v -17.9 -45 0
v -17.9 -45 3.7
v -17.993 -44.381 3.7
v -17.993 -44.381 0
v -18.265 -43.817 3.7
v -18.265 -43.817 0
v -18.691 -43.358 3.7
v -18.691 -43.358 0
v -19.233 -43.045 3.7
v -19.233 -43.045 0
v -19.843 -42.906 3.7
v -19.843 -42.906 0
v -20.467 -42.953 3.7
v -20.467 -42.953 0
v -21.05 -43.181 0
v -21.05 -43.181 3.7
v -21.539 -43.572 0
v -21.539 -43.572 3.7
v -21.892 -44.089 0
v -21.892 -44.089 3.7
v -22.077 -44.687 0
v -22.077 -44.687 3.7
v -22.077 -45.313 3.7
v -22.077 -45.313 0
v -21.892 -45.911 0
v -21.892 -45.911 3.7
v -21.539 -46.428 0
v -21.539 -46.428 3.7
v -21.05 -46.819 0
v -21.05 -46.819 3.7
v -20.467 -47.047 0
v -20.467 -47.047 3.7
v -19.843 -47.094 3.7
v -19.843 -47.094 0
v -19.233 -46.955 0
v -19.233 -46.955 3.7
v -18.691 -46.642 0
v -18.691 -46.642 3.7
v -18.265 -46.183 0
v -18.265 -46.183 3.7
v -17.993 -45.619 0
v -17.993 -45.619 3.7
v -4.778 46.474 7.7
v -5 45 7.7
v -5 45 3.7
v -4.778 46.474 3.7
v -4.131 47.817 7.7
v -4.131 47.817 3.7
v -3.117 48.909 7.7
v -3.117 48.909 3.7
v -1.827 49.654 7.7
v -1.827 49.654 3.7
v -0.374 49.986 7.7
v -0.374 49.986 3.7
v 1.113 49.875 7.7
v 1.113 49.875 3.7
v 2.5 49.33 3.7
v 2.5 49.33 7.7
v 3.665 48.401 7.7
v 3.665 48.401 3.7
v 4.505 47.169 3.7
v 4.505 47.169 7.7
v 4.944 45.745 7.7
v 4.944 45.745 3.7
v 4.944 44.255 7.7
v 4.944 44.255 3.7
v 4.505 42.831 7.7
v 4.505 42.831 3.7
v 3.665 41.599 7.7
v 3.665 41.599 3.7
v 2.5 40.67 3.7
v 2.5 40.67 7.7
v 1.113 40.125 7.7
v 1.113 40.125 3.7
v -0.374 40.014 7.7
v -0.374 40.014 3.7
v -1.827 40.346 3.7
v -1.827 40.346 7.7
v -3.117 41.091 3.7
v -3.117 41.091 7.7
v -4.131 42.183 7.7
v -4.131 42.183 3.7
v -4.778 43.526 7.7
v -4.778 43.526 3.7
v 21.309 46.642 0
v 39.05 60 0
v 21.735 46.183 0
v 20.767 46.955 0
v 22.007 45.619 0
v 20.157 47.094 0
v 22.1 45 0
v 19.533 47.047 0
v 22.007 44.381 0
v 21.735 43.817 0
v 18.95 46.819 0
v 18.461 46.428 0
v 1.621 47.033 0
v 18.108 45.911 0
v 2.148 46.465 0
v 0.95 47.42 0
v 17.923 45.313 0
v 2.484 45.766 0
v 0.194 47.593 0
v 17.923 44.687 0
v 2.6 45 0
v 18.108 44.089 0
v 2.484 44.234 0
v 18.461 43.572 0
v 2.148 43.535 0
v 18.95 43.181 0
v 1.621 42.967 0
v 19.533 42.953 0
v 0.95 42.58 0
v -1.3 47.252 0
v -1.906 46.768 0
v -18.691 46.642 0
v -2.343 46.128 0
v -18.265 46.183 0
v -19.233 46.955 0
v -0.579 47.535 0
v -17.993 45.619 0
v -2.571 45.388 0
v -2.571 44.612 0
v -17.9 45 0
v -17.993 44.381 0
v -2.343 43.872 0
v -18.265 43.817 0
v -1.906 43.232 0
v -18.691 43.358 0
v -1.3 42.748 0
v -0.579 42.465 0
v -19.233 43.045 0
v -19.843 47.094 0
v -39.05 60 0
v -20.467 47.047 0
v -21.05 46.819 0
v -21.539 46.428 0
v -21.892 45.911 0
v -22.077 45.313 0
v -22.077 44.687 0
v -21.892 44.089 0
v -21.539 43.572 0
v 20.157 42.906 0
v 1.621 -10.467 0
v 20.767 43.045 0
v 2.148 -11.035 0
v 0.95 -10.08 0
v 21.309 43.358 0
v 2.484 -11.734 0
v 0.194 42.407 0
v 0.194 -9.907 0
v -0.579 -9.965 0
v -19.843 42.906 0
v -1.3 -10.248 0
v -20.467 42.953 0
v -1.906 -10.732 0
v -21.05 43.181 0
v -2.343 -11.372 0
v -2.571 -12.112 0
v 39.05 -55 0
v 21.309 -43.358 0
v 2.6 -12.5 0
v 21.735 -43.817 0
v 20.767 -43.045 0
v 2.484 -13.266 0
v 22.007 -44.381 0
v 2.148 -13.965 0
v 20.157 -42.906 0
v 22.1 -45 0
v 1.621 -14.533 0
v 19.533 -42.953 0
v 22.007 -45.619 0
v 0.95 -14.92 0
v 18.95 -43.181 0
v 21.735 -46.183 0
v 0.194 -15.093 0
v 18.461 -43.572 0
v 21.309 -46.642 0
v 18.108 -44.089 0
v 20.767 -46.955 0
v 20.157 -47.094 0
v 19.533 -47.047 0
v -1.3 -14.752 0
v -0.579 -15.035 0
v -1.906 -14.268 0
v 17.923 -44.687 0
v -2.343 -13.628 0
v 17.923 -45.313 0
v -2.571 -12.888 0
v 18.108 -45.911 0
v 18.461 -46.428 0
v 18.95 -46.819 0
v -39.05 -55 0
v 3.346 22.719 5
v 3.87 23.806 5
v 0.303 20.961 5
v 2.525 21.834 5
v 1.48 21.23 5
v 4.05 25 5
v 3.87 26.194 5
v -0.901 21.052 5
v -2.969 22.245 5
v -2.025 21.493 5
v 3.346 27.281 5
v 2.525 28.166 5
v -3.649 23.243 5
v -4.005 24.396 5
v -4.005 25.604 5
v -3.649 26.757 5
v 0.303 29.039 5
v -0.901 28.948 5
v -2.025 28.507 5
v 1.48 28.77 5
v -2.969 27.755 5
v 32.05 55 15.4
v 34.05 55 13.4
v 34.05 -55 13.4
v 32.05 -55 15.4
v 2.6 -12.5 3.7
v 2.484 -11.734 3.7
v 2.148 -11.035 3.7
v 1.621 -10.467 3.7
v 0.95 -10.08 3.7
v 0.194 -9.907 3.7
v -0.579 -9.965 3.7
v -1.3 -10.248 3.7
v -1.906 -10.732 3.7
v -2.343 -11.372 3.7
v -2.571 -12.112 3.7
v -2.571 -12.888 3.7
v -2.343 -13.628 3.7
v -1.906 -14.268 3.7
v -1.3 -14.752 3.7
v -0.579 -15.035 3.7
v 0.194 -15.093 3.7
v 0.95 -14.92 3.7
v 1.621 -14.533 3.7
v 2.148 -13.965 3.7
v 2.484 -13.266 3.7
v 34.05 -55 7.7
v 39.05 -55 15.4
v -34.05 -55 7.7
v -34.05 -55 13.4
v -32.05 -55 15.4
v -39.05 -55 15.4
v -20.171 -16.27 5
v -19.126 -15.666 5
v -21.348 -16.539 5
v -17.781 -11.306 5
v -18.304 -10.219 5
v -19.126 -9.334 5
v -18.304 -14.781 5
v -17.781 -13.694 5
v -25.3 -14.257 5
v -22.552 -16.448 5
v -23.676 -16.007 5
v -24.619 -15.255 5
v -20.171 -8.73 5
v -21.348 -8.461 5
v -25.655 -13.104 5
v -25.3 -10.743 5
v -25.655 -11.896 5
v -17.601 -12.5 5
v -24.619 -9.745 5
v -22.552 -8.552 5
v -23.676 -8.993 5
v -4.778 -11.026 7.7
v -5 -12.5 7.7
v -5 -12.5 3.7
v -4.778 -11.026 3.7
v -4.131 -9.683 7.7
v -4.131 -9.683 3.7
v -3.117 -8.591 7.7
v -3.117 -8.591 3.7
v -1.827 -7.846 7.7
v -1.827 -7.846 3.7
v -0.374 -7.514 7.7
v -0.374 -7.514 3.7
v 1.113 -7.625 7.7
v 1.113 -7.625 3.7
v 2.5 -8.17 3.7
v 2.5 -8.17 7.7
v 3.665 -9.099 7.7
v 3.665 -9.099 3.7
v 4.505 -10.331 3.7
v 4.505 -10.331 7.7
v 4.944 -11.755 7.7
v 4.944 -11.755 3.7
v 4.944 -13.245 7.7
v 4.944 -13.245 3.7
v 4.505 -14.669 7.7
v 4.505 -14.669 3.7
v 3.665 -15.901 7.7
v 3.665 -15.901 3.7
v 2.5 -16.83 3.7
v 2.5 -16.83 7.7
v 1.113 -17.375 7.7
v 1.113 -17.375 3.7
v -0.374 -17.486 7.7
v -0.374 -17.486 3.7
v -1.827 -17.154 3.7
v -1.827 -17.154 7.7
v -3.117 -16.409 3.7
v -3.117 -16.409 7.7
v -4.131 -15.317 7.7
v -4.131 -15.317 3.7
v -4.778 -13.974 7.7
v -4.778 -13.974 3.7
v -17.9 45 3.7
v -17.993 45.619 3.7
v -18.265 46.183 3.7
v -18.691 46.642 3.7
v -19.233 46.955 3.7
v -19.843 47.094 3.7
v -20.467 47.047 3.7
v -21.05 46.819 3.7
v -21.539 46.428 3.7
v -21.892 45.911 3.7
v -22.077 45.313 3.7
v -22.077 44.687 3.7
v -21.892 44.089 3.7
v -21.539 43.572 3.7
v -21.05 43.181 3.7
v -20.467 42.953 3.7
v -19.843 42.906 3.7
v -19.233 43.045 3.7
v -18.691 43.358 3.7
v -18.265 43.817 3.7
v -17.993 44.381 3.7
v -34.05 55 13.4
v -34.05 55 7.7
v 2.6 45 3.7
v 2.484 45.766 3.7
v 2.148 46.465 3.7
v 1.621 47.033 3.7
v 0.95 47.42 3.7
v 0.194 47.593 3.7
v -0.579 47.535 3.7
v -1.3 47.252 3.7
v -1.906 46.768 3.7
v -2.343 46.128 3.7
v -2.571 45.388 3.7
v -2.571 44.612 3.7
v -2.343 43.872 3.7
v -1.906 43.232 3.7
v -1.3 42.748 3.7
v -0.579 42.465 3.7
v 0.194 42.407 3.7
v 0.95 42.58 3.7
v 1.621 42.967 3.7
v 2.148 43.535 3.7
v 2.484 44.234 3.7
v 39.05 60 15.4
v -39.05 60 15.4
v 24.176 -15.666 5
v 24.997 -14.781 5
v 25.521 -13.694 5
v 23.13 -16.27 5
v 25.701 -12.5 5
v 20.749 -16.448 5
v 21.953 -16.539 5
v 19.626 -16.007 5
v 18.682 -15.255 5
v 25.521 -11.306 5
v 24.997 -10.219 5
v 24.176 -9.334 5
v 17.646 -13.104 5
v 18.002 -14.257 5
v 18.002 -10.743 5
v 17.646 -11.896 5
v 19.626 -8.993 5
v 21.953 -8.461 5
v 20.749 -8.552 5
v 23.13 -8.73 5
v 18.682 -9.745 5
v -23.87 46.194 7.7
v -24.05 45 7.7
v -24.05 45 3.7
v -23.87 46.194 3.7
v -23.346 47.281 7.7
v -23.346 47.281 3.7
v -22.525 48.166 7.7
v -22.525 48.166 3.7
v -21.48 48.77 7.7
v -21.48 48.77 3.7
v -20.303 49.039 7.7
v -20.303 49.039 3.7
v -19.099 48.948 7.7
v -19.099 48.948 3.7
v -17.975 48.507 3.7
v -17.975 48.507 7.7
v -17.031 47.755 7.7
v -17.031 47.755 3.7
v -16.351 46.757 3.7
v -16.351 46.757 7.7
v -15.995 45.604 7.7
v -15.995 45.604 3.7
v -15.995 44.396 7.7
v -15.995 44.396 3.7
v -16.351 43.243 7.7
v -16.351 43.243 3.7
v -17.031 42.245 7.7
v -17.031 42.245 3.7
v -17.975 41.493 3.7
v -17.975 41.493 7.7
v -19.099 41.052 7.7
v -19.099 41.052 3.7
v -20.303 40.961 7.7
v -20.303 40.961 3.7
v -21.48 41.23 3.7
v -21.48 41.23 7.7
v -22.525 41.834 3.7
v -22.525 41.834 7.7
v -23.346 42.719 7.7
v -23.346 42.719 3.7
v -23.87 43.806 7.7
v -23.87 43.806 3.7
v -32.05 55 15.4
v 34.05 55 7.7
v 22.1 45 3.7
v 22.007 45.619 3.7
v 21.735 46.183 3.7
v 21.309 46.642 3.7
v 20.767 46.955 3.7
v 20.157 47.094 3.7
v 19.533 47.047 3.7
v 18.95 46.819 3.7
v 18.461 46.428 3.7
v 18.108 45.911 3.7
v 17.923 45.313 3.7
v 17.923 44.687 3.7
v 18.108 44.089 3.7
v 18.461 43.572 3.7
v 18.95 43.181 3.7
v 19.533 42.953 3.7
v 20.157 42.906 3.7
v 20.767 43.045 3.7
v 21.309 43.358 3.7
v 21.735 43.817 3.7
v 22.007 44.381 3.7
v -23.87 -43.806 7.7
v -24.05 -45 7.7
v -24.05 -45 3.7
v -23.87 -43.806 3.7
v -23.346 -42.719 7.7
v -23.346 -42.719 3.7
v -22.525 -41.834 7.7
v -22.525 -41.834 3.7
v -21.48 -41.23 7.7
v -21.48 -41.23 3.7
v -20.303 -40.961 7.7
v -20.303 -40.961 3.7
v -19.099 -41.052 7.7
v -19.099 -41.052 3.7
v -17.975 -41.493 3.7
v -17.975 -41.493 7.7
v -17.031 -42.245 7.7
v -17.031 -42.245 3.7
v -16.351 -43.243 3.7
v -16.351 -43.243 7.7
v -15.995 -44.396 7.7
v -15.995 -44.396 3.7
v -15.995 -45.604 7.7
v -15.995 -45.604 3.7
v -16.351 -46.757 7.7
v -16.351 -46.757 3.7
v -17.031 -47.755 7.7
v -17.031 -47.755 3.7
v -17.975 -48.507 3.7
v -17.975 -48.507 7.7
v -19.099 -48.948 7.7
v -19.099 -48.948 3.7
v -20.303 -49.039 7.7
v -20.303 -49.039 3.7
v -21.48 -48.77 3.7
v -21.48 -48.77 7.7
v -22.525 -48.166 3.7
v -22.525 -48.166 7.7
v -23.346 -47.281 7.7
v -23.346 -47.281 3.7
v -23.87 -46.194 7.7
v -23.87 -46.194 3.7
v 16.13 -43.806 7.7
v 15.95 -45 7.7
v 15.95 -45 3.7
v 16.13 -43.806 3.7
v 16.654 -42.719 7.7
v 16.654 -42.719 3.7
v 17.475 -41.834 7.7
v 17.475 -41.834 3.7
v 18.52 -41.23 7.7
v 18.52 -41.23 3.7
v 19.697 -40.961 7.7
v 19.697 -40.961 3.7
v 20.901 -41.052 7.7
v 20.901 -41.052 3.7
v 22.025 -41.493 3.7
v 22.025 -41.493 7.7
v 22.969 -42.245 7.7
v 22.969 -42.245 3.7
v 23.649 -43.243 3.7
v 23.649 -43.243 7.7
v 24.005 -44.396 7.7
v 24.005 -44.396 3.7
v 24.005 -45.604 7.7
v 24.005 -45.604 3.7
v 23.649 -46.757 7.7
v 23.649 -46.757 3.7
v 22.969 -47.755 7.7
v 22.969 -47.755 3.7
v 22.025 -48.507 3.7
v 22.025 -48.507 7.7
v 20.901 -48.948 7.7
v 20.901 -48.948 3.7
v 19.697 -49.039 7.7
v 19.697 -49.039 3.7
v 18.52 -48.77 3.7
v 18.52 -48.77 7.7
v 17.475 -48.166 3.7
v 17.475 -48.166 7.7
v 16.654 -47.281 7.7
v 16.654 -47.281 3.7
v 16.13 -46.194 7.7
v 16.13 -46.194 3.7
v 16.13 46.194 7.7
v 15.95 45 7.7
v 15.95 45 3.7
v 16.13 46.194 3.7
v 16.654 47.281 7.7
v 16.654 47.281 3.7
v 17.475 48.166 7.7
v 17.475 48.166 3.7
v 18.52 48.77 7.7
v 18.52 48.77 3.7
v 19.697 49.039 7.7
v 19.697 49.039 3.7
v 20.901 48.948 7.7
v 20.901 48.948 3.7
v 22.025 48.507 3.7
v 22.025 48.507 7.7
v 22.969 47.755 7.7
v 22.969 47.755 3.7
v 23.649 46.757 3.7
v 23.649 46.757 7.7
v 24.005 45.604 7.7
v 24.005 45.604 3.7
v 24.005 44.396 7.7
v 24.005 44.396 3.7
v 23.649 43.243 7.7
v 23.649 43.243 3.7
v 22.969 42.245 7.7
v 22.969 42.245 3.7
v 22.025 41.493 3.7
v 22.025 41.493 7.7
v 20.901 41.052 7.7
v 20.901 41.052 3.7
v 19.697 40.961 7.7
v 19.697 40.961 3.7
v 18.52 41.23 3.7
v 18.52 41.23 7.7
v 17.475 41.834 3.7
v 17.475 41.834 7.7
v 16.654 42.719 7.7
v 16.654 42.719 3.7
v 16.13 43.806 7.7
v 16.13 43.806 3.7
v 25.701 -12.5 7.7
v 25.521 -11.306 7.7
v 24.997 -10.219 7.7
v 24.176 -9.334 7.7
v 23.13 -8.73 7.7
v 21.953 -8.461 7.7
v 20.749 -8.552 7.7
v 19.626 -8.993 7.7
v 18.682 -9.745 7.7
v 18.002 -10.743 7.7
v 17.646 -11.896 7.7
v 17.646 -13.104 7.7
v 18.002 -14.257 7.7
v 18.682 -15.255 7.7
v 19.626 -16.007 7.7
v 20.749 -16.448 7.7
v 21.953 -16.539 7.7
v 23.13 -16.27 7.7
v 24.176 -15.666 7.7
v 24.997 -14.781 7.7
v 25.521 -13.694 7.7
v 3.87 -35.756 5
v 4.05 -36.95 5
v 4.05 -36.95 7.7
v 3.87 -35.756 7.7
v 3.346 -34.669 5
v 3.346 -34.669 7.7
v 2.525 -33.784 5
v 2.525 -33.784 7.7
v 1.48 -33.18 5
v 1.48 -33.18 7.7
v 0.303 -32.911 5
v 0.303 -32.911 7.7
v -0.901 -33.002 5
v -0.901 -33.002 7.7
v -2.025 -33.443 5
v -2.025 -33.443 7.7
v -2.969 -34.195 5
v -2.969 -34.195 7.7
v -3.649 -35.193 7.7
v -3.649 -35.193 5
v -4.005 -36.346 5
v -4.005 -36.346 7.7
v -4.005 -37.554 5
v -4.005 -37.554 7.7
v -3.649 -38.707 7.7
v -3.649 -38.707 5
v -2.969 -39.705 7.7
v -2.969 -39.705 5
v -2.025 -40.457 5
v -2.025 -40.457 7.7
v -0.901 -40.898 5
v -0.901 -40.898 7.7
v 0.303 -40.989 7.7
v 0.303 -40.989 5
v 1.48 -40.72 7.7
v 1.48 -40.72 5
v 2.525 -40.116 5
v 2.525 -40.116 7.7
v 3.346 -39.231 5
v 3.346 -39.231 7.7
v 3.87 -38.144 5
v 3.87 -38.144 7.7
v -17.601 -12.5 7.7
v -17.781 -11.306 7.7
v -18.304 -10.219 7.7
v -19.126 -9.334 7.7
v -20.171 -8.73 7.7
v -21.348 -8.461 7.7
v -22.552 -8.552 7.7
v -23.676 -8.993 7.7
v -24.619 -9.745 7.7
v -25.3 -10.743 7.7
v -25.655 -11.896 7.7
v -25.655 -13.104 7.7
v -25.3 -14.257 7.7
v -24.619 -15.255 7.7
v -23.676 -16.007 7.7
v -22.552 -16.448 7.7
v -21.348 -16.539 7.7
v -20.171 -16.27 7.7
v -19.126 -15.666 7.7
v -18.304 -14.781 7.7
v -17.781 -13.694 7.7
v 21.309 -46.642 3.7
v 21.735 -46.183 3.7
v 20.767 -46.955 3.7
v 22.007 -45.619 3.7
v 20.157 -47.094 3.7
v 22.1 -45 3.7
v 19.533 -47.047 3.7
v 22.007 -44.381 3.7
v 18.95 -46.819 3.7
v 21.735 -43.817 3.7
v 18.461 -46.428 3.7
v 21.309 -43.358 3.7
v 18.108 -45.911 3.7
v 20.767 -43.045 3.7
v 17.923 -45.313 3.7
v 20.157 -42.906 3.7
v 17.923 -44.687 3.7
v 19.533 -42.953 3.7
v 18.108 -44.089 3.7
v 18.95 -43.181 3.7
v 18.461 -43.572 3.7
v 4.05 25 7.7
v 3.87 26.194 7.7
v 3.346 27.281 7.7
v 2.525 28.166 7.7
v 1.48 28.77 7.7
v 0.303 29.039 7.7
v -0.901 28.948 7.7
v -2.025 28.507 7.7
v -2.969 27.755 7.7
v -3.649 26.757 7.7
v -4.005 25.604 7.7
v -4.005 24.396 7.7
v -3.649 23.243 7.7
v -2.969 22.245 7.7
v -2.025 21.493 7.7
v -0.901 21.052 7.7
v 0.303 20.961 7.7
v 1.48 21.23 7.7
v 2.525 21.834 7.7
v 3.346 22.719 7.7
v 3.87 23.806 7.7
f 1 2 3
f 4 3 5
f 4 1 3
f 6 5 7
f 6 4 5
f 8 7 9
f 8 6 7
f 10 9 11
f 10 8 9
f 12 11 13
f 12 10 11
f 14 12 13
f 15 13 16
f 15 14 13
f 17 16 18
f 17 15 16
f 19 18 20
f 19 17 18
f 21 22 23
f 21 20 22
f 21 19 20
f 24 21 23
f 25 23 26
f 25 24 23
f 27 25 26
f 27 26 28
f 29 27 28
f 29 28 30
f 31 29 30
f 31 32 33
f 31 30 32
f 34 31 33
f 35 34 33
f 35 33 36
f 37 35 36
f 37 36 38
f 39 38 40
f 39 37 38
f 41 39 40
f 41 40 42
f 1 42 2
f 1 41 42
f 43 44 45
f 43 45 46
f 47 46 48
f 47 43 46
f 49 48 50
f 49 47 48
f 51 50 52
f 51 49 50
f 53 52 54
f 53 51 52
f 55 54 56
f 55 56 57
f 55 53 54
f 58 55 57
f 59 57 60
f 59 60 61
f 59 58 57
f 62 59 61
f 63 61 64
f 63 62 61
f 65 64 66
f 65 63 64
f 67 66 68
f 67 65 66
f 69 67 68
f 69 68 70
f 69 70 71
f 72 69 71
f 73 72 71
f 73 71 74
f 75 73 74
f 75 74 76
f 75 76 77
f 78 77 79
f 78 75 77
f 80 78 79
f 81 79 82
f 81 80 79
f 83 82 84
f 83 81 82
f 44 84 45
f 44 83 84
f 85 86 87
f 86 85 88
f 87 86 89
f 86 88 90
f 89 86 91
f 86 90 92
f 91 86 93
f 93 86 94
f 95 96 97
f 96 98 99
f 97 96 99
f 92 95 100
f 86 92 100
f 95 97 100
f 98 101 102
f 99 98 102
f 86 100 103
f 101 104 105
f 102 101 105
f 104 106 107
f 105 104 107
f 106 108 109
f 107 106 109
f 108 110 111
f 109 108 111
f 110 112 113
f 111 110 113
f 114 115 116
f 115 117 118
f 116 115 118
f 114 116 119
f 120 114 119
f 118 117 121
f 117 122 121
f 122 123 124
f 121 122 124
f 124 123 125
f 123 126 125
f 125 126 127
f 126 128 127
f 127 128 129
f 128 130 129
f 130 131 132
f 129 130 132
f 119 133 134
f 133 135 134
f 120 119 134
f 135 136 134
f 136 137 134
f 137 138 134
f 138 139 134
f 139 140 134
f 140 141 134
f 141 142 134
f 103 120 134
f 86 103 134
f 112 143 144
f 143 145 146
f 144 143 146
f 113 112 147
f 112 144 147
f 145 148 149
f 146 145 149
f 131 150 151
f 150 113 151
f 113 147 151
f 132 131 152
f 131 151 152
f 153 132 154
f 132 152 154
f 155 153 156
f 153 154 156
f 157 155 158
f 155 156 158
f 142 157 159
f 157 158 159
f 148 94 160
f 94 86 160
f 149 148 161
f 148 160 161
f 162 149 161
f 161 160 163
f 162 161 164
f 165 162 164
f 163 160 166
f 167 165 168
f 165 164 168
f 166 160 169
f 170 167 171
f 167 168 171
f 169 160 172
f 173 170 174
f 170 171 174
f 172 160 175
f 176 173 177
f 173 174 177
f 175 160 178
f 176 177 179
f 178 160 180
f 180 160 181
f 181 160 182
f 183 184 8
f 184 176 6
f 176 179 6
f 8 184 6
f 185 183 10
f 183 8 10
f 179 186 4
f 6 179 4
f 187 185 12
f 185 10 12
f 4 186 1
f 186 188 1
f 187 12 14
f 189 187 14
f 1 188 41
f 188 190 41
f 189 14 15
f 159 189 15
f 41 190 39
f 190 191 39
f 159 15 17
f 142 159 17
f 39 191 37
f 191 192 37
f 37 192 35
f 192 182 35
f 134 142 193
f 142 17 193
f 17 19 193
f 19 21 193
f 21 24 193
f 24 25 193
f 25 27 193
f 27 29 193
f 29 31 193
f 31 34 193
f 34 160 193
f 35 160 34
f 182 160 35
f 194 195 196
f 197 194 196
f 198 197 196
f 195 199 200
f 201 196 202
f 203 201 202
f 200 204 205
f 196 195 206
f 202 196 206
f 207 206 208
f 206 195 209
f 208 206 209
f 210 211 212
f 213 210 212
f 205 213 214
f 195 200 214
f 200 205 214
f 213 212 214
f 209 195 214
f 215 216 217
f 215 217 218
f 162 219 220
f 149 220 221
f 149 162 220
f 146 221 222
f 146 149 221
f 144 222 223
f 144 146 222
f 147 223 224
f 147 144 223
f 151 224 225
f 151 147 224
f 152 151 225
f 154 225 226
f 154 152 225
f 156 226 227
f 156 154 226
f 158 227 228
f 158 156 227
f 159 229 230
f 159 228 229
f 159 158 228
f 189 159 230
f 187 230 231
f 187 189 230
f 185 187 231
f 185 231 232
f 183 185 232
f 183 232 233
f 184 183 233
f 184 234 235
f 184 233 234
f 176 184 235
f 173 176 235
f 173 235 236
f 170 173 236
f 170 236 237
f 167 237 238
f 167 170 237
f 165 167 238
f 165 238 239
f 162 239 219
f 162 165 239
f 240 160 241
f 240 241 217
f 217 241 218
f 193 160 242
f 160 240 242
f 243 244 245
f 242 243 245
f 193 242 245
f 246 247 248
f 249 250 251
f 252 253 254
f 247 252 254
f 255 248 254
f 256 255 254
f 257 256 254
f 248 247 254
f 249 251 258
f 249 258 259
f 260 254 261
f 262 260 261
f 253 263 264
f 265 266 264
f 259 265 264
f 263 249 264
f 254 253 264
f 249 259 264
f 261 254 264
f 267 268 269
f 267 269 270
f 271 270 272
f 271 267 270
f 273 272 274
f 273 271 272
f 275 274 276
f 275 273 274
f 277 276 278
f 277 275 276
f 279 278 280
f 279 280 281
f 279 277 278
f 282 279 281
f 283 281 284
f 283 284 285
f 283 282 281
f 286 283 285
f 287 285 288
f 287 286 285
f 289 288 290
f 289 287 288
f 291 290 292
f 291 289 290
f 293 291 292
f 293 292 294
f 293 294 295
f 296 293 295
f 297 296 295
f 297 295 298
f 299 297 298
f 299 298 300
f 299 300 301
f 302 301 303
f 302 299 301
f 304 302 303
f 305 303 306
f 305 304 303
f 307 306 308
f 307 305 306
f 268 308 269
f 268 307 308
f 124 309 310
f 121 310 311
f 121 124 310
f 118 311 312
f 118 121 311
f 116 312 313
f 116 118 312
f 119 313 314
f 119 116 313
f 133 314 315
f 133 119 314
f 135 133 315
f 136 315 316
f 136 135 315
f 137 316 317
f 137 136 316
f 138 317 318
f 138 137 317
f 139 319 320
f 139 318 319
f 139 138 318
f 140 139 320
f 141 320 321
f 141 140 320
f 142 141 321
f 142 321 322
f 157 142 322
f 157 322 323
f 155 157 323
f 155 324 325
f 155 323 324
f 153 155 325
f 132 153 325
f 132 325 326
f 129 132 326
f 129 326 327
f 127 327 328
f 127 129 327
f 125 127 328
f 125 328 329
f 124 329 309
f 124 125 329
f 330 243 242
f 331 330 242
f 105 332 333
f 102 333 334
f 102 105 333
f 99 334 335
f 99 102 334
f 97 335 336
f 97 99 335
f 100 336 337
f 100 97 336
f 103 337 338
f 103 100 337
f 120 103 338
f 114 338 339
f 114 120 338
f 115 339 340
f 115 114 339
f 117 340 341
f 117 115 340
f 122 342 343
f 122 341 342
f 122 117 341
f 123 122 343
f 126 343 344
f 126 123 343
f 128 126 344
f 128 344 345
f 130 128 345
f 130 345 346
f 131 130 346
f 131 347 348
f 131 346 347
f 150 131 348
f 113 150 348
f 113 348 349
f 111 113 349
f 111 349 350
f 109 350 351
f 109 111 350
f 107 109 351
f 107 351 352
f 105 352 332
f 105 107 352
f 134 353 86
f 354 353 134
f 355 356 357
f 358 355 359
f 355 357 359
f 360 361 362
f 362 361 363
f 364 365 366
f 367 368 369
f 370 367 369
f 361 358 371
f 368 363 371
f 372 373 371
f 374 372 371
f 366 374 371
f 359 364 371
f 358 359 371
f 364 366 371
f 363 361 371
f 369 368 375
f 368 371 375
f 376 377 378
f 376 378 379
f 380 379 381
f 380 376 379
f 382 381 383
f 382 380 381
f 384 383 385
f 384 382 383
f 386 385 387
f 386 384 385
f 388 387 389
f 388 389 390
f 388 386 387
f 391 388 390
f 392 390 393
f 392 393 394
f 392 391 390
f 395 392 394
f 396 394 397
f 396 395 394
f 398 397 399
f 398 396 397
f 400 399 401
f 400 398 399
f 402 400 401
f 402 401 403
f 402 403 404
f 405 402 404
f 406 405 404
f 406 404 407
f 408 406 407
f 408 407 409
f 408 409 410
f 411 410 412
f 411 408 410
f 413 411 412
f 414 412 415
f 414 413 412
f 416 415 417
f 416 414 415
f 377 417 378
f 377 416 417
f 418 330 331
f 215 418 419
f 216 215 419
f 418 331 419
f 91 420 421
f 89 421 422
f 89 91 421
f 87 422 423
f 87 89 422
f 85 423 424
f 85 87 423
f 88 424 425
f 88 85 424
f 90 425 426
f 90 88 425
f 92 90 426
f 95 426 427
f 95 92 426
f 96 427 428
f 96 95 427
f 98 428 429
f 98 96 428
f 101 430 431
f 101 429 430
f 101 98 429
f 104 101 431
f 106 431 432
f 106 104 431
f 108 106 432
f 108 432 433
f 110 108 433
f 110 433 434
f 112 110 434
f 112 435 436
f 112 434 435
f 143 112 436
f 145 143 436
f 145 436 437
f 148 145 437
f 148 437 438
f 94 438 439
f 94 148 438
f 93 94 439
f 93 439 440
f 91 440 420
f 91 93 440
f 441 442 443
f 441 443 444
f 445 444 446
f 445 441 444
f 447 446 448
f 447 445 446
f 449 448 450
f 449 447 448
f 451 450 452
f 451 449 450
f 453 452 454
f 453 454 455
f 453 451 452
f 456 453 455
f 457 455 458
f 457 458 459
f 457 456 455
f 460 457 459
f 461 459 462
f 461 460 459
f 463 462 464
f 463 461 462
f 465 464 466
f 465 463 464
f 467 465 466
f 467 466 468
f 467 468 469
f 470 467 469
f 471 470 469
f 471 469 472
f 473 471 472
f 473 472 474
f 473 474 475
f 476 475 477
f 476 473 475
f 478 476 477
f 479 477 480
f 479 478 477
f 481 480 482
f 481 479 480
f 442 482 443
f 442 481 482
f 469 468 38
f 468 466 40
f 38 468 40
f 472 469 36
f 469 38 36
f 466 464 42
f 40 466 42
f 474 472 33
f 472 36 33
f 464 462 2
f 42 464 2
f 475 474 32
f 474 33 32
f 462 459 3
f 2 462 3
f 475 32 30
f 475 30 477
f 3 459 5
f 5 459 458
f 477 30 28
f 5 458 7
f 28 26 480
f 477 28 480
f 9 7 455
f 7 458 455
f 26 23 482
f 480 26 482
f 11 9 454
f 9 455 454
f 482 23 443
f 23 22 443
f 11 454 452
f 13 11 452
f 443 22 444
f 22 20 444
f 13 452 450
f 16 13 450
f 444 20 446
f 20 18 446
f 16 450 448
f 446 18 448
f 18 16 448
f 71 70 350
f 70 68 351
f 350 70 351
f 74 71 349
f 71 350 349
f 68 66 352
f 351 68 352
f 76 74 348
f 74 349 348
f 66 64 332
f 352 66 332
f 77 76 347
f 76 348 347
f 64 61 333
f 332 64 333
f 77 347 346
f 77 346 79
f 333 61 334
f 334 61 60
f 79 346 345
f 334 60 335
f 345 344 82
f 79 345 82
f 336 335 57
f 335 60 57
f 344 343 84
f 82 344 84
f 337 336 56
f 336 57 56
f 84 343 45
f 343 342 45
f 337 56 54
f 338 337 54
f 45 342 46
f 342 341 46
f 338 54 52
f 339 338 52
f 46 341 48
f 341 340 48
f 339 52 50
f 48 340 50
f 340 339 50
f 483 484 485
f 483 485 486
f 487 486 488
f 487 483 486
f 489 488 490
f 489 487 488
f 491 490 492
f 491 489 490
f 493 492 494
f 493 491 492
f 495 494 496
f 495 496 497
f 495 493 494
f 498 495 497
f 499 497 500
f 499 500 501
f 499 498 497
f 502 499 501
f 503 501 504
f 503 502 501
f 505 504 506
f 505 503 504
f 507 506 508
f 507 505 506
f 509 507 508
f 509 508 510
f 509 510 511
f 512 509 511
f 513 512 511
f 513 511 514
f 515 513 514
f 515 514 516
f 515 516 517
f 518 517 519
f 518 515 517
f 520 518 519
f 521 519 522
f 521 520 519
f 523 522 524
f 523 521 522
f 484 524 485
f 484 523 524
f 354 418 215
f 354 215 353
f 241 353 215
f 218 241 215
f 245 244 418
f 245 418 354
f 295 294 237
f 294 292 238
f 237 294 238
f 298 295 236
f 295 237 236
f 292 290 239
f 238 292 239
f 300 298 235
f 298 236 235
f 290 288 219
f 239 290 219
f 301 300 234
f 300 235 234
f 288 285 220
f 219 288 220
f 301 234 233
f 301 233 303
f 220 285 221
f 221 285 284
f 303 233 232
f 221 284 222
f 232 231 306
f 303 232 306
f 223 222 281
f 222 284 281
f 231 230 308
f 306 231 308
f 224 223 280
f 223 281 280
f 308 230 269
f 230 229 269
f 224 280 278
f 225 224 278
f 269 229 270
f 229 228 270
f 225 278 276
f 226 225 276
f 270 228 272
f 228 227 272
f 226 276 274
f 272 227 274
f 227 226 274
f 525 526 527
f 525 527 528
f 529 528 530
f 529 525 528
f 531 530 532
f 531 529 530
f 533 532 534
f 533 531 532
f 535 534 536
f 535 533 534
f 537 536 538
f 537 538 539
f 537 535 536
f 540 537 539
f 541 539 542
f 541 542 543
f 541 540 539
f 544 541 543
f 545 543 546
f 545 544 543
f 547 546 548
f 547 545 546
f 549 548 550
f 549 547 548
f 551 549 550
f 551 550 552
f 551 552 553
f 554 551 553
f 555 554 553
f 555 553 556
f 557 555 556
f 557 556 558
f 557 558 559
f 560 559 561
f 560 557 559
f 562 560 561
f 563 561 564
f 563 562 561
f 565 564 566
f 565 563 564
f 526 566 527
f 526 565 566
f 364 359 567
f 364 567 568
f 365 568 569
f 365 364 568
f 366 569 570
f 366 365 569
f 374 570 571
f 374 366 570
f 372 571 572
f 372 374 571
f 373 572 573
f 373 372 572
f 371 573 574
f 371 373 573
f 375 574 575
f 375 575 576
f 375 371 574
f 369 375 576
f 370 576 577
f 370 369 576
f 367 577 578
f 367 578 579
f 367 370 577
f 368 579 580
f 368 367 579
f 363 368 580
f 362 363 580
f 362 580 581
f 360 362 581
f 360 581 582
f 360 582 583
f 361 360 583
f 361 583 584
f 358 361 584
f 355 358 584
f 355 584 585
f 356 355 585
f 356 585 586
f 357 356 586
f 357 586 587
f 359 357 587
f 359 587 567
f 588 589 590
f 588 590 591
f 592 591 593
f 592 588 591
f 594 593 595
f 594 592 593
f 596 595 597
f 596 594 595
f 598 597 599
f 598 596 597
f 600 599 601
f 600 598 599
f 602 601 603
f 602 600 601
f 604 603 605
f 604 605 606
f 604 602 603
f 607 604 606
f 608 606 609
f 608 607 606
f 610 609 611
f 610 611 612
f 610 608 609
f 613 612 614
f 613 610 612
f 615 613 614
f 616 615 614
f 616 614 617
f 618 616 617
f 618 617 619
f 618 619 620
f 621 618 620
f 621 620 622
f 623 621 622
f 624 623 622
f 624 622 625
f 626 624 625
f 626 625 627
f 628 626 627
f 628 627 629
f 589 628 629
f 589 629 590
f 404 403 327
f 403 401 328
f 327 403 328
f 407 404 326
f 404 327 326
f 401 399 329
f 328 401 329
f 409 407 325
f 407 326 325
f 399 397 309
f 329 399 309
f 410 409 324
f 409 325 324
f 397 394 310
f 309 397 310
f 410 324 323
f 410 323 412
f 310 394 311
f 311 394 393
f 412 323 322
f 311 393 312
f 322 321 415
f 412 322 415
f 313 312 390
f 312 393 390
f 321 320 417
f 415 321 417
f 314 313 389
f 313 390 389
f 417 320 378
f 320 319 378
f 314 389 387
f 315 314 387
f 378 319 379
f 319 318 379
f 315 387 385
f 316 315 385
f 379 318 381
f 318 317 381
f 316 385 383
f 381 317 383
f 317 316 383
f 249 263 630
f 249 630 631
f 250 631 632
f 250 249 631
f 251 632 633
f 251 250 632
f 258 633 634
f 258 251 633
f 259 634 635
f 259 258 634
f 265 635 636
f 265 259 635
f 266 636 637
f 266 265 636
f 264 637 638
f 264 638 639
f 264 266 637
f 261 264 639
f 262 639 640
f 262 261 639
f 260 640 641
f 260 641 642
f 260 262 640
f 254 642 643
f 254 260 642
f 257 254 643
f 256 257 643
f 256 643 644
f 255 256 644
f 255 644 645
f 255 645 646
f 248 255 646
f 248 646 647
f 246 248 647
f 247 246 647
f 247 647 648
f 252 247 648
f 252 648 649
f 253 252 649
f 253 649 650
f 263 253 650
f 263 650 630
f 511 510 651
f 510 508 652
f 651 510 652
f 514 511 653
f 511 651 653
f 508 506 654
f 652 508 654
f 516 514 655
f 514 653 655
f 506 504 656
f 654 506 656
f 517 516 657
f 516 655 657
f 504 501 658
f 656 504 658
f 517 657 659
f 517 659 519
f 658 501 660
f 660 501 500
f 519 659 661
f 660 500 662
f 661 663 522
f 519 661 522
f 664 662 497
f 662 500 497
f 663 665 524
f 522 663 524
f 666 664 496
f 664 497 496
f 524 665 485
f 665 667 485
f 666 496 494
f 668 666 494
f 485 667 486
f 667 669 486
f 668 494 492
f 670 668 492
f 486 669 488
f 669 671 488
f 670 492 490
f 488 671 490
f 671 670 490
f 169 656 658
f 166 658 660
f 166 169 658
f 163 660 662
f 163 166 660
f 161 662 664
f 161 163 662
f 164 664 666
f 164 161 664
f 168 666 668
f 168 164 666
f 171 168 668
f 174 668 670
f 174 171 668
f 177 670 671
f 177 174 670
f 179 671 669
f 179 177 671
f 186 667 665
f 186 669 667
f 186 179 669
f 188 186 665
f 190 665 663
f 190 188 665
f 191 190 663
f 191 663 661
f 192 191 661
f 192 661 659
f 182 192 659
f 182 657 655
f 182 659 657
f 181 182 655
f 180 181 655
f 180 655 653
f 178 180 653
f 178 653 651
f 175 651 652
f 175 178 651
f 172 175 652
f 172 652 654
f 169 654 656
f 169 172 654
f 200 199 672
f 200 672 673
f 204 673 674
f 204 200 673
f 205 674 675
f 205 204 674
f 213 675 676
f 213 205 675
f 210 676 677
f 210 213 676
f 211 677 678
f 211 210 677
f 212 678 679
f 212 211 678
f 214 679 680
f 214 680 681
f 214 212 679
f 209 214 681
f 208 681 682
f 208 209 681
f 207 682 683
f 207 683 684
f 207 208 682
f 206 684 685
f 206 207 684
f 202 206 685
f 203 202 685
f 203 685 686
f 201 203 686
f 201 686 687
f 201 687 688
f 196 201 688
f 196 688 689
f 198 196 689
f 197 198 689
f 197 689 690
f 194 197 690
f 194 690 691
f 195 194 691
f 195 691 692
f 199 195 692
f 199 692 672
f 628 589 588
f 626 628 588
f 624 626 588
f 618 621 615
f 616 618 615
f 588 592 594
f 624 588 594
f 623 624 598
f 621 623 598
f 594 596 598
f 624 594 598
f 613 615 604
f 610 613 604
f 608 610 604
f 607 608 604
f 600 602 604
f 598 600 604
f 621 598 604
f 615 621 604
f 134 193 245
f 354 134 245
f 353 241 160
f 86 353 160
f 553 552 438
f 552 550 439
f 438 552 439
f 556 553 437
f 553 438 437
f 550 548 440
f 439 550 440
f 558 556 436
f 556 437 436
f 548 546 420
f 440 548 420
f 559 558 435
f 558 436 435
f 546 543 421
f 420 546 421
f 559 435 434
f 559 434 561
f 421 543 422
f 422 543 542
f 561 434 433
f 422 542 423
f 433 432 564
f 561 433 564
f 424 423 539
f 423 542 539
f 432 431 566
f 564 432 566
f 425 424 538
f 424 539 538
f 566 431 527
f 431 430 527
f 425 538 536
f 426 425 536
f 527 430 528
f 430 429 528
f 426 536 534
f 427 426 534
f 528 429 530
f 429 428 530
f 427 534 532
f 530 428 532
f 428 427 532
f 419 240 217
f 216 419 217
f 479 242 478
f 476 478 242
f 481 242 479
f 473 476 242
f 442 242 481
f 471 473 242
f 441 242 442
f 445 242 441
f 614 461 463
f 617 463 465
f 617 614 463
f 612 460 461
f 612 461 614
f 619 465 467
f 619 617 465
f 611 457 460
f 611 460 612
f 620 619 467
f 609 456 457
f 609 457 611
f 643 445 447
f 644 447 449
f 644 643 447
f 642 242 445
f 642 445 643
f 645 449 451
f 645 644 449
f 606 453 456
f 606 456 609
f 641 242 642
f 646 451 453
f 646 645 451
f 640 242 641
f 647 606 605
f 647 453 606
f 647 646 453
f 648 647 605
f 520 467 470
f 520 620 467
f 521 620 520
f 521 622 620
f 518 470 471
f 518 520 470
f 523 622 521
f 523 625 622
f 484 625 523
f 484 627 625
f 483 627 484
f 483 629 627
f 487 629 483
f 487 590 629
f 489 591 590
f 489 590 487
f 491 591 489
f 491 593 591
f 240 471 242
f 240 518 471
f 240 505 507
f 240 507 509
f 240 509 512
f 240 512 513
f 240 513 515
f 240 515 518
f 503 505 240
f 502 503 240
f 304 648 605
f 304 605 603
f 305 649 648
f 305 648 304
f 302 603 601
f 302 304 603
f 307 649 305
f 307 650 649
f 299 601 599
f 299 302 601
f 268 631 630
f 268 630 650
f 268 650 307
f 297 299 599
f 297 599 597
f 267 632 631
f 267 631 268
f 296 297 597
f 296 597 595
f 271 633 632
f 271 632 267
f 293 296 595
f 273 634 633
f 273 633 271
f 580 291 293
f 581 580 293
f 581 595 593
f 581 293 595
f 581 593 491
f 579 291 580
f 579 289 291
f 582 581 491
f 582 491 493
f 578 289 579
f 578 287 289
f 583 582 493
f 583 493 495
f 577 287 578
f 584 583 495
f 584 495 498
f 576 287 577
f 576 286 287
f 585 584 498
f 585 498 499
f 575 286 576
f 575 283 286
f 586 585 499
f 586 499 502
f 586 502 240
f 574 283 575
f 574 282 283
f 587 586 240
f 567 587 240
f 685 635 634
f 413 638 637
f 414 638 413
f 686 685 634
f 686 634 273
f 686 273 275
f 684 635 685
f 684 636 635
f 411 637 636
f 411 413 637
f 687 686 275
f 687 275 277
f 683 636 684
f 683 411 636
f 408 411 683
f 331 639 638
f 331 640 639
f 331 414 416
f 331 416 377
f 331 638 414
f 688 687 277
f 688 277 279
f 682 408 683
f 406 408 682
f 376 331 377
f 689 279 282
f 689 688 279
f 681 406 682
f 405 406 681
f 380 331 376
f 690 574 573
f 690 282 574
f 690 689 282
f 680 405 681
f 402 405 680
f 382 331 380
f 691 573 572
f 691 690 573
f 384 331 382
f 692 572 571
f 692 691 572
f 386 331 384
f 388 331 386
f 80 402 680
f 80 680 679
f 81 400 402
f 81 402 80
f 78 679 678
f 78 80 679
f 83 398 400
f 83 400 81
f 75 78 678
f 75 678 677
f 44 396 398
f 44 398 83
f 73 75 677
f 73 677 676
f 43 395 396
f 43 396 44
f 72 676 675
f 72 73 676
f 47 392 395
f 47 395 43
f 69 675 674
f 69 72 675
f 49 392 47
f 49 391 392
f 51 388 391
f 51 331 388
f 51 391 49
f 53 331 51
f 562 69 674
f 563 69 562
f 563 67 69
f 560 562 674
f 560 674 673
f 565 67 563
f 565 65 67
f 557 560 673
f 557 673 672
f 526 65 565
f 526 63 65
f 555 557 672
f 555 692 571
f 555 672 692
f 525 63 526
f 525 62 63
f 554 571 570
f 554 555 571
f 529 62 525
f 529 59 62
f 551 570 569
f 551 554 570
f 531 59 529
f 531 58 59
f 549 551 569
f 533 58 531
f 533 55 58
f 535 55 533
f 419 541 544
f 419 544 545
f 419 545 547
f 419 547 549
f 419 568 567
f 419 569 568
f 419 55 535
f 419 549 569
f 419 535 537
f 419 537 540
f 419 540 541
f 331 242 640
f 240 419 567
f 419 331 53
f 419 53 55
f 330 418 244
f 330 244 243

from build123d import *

# Parameters (mm, degrees)
SKETCH1_W                = 68.1
SKETCH1_H                = 110
SKETCH1_R                = 2.1
SKETCH1_R_2              = 4.05
SKETCH1_R_3              = 2.6
BOSS_EXTRUDE1_DEPTH      = 7.7
SKETCH2_R                = 6.304633146
SKETCH2_R_2              = 7.334333348
SKETCH2_R_3              = 8.114040952
SKETCH2_R_4              = 11.073656437
BOSS_EXTRUDE2_DEPTH      = 5
SKETCH3_R                = 4.05
SKETCH3_R_2              = 5
CUT_EXTRUDE1_DEPTH       = 4
SKETCH4_W                = 68.1
SKETCH4_H                = 5
BOSS_EXTRUDE3_DEPTH      = 7.7
BOSS_EXTRUDE3_DEPTH_BACK = 7.7
BOSS_EXTRUDE4_DEPTH      = 115


with BuildPart() as part:
    # Sketch1 → Boss-Extrude1 (new body)
    with BuildSketch(Plane.XY):
        Rectangle(SKETCH1_W, SKETCH1_H)
        with Locations((20, 45)):
            Circle(SKETCH1_R, mode=Mode.SUBTRACT)
        with Locations((-20, 45)):
            Circle(SKETCH1_R, mode=Mode.SUBTRACT)
        with Locations((20, -45)):
            Circle(SKETCH1_R, mode=Mode.SUBTRACT)
        with Locations((-20, -45)):
            Circle(SKETCH1_R, mode=Mode.SUBTRACT)
        with Locations((21.650635095, -12.5)):
            Circle(SKETCH1_R_2, mode=Mode.SUBTRACT)
        with Locations((0, 25)):
            Circle(SKETCH1_R_2, mode=Mode.SUBTRACT)
        with Locations((-21.650635095, -12.5)):
            Circle(SKETCH1_R_2, mode=Mode.SUBTRACT)
        with Locations((0, -36.95)):
            Circle(SKETCH1_R_2, mode=Mode.SUBTRACT)
        with Locations((0, 45)):
            Circle(SKETCH1_R_3, mode=Mode.SUBTRACT)
        with Locations((0, -12.5)):
            Circle(SKETCH1_R_3, mode=Mode.SUBTRACT)
    extrude(amount=BOSS_EXTRUDE1_DEPTH)

    # Sketch2 → Boss-Extrude2 (add)
    with BuildSketch(Plane(origin=(0, 0, 0), x_dir=(-1, 0, 0), z_dir=(0, 0, -1))):
        with Locations((-21.650635095, -12.5)):
            Circle(SKETCH2_R)
        with Locations((0, 25)):
            Circle(SKETCH2_R_2)
        with Locations((21.650635095, -12.5)):
            Circle(SKETCH2_R_3)
        with Locations((0, -36.95)):
            Circle(SKETCH2_R_4)
    extrude(amount=-BOSS_EXTRUDE2_DEPTH)

    # Sketch3 → Cut-Extrude1 (cut)
    with BuildSketch(Plane(origin=(0, 0, 7.7), x_dir=(-1, 0, 0), z_dir=(0, 0, -1))):
        with Locations((-20, 45)):
            Circle(SKETCH3_R)
        with Locations((20, 45)):
            Circle(SKETCH3_R)
        with Locations((-20, -45)):
            Circle(SKETCH3_R)
        with Locations((20, -45)):
            Circle(SKETCH3_R)
        with Locations((0, 45)):
            Circle(SKETCH3_R_2)
        with Locations((0, -12.5)):
            Circle(SKETCH3_R_2)
    extrude(amount=CUT_EXTRUDE1_DEPTH, mode=Mode.SUBTRACT)

    # Sketch4 → Boss-Extrude3 (add, two sides)
    with BuildSketch(Plane.XY.offset(7.7)) as boss_extrude3_sk:
        with Locations((0, 57.5)):
            Rectangle(SKETCH4_W, SKETCH4_H)
    extrude(amount=BOSS_EXTRUDE3_DEPTH)
    extrude(boss_extrude3_sk.sketch, amount=-BOSS_EXTRUDE3_DEPTH_BACK)

    # Sketch7 → Boss-Extrude4 (add)
    with BuildSketch(Plane.XZ.offset(55)):
        Polygon((-34.05, 15.4), (-32.05, 15.4), (-34.05, 13.4), (-34.05, 0), (-39.05, 0), (-39.05, 15.4), align=None)
        Polygon((39.05, 0), (34.05, 0), (34.05, 13.4), (32.05, 15.4), (34.05, 15.4), (39.05, 15.4), align=None)
    extrude(amount=-BOSS_EXTRUDE4_DEPTH)


solid = part.part
